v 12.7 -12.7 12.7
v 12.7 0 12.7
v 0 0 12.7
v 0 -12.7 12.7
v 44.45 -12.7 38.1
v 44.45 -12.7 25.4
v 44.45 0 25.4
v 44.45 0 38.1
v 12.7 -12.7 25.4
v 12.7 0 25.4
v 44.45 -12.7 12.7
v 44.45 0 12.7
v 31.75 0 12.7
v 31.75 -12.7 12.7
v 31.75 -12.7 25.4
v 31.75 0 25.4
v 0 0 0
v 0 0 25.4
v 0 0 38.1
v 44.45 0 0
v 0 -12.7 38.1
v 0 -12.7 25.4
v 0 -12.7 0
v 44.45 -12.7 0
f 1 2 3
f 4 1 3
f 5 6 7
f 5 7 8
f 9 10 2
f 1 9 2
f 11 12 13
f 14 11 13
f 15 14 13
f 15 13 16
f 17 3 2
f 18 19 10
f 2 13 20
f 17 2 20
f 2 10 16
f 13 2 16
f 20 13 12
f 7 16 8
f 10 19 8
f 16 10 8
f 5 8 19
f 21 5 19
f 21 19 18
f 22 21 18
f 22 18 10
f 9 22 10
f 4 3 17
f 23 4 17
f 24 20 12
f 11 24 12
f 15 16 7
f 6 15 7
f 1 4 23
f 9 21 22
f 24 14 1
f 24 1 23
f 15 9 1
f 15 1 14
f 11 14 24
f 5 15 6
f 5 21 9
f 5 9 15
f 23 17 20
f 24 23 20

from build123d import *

# Parameters (mm, degrees)
F1_DEPTH = 12.7


with BuildPart() as f1:
    # F0 (on Front) → F1 (new body)
    with BuildSketch(Plane.XZ):
        Polygon((0, 12.7), (0, 0), (44.45, 0), (44.45, 12.7), (31.75, 12.7), (31.75, 25.4), (44.45, 25.4), (44.45, 38.1), (0, 38.1), (0, 25.4), (12.7, 25.4), (12.7, 12.7), align=None)
    extrude(amount=F1_DEPTH)


solid = f1.part
